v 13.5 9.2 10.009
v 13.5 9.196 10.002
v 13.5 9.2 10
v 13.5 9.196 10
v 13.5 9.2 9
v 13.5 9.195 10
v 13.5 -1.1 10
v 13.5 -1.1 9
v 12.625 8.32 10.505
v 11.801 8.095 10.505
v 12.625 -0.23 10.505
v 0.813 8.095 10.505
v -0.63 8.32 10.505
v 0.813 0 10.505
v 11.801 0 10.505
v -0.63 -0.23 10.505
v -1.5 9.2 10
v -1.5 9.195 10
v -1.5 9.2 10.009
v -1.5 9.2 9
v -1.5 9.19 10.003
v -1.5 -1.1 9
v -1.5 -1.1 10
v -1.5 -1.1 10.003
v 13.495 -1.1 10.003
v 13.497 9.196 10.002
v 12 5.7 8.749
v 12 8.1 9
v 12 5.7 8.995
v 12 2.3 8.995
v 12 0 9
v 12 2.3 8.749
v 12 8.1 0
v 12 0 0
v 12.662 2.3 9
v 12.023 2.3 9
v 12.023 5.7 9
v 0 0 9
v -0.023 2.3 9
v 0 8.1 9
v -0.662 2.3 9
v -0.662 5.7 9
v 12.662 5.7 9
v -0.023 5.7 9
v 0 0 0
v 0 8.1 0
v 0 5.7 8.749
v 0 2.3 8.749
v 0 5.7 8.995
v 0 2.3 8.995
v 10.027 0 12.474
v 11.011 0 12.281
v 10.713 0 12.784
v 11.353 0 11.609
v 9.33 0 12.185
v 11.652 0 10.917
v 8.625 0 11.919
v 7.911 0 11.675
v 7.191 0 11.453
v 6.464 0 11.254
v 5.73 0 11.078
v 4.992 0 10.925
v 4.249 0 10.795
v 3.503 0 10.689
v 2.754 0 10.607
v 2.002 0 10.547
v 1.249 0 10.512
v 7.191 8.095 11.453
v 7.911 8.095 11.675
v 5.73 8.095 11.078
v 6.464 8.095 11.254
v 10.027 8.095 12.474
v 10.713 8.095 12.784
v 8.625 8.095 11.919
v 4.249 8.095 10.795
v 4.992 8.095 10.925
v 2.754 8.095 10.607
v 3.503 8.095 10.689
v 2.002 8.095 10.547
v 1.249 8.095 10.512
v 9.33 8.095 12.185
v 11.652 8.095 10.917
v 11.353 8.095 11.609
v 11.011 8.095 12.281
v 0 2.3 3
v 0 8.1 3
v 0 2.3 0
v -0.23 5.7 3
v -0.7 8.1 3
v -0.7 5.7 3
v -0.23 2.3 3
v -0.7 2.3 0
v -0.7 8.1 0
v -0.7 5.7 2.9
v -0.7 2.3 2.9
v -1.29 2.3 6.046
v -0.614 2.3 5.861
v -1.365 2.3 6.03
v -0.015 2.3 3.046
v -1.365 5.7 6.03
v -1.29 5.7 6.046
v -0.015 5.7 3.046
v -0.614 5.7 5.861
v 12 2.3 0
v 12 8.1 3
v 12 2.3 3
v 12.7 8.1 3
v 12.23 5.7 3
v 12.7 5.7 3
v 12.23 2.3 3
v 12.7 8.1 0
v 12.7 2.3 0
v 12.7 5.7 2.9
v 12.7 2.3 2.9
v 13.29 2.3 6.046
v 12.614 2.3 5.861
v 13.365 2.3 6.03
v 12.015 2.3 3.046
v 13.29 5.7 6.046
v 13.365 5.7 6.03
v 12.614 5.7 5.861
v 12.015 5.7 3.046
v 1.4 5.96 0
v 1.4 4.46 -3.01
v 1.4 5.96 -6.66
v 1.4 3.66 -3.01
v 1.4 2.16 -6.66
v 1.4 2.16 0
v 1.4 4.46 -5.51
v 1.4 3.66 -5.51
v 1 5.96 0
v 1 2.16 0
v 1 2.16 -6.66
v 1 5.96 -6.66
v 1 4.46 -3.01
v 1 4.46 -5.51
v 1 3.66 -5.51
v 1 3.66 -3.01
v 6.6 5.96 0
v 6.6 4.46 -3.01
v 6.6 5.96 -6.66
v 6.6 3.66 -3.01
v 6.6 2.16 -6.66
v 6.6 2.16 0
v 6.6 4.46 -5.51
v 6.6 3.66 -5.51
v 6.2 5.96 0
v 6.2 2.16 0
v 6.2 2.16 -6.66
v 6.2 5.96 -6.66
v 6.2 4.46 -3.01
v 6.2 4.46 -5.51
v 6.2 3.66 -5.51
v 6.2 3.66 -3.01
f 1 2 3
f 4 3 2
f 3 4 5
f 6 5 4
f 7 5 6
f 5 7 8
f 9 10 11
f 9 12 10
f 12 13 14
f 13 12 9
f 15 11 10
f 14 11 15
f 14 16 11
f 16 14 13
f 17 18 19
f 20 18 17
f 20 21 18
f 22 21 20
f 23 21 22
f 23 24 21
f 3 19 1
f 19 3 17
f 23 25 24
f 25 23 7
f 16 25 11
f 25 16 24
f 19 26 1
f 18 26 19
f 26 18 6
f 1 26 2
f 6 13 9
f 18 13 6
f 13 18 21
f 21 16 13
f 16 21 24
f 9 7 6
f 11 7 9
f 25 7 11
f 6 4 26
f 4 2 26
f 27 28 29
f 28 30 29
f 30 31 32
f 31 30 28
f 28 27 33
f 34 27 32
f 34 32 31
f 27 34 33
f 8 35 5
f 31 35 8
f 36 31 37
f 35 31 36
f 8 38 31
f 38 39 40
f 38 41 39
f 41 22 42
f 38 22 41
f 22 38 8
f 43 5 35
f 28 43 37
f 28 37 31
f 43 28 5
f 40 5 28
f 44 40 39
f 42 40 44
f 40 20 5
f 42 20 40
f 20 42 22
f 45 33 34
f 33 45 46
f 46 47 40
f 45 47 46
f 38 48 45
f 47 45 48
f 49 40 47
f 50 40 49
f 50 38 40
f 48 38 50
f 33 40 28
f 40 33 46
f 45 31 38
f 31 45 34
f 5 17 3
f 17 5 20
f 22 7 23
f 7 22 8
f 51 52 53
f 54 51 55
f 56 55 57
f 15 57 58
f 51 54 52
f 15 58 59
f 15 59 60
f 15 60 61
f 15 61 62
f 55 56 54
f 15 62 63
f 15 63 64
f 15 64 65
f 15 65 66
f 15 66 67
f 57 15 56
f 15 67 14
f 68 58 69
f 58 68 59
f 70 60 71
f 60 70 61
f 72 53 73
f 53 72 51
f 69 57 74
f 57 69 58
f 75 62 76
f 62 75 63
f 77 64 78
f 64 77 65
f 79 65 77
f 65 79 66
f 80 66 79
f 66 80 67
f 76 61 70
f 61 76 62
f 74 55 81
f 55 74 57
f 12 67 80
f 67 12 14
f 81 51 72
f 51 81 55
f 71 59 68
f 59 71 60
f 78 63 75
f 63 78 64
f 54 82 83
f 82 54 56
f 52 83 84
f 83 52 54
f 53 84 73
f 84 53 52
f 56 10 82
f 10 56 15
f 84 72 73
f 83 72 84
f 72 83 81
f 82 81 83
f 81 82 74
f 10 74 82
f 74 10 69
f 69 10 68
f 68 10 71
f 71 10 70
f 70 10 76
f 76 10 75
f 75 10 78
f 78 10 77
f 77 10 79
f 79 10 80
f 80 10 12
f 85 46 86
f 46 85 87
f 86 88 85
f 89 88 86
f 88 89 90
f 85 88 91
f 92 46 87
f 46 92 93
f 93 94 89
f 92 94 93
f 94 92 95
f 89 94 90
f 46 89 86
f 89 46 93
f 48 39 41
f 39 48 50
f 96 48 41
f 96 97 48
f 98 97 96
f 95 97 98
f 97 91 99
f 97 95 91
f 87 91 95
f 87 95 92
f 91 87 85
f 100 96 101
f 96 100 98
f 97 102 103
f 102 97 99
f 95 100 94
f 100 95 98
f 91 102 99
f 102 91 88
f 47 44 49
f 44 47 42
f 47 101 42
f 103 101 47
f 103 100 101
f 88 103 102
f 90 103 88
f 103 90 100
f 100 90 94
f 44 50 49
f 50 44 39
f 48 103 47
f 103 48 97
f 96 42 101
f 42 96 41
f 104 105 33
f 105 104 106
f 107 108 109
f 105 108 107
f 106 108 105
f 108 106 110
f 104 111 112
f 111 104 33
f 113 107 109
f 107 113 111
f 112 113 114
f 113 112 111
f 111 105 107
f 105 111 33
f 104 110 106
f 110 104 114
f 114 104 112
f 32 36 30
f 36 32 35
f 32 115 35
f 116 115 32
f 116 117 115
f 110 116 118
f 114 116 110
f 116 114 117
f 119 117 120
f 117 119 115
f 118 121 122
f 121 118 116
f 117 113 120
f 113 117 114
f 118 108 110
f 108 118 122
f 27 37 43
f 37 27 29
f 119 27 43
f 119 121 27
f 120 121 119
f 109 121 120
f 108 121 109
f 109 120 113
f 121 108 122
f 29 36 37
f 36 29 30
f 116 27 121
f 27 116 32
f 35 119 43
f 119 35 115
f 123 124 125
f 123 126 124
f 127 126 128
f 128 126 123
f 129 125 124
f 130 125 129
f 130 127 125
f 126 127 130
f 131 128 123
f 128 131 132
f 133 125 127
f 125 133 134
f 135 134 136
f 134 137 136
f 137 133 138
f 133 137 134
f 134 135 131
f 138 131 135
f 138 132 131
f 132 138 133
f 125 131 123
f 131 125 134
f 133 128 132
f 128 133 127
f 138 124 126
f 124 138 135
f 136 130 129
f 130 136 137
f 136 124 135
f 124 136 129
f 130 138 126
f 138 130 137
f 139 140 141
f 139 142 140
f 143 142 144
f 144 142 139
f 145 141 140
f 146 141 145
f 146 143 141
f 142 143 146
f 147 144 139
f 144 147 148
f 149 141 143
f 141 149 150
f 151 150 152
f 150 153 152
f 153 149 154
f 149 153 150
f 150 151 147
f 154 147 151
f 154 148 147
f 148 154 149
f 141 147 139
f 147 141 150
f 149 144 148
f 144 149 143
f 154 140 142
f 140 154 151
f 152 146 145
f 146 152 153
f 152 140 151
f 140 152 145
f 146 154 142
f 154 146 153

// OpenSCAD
switch_kcd11();

module switch_kcd11()
{
  switch_main_box();

  translate([0.5, 0, 10.5])
    switch_button();
  
  switch_clicks();
  
  switch_contacts();  
}

module switch_main_box()
{
  color([0.25,0.25,0.25,1])
  {
      cube([12, 8.10, 9], false);
      translate([-1.5, -1.1, 9]) 
        cube([15, 10.3, 1], false);
      translate([-1.5, -1.1, 10]) 
        difference()
        {
            cube([15, 10.3, 0.505], false);
            {
              translate([-0.005, -0.005, 0])
                rotate([30,0,0])
                  cube([15.01, 2, 1], false);
              translate([-0.005, 10.295, 0])
                rotate([60,0,0])
                  cube([15.01, 1.01, 2], false);
              translate([-0.005, -0.005, 0])
                rotate([0,-30,0])
                  cube([2, 10.301, 2]);
              translate([15, -0.005, 0])
                rotate([0,-60,0])
                  cube([2, 10.301, 2]);
            }
        }
  }
}

module switch_contacts()
{
  color("silver")
  {
      translate([1, 2.16, -6.66])
        switch_contact();
      translate([6.2, 2.16, -6.66])
        switch_contact();
  }
}

module switch_contact()
{
  difference()
  {
      cube([0.4, 3.8, 6.66], false);
      translate([-0.005, 1.5, 1.15]) 
        cube([0.41, 0.8, 2.5], false);
  }
}


module switch_clicks()
{
    color("grey")
    {
        translate([-0.7, 2.3, 0])
          switch_click();
        
        translate([12.7,2.3,0])
          mirror([1,0,0])
           switch_click();
    }
}
module switch_click()
{
    cube([0.7, 5.8, 3], false);
    translate([0,0,2.9])
      rotate([0,-12,0])
        cube([0.7, 3.4, 3.2], false);
    translate([-0.6,0,6])
      rotate([0,12,0])
        cube([0.7, 3.4, 3.2], false);
}

module switch_button()
{
    color("grey")
    {
        cyld1 = 24;
        cyld2 = 12;
        intersection()
        {
            difference()
            {
                cube([13.33, 8.1, 3]);
                translate([-0.005, 8.105, cyld1])
                  rotate([90,0,0])
                    cylinder(8.11, cyld1, cyld1, [0, cyld1, 0], $fn=200);
            } 
            translate([-0.005, 8.095, -4])
              rotate([90,0,0])
                cylinder(8.11, cyld2, cyld2, [0, cyld1, 0], $fn=100);
        }
    }
}
